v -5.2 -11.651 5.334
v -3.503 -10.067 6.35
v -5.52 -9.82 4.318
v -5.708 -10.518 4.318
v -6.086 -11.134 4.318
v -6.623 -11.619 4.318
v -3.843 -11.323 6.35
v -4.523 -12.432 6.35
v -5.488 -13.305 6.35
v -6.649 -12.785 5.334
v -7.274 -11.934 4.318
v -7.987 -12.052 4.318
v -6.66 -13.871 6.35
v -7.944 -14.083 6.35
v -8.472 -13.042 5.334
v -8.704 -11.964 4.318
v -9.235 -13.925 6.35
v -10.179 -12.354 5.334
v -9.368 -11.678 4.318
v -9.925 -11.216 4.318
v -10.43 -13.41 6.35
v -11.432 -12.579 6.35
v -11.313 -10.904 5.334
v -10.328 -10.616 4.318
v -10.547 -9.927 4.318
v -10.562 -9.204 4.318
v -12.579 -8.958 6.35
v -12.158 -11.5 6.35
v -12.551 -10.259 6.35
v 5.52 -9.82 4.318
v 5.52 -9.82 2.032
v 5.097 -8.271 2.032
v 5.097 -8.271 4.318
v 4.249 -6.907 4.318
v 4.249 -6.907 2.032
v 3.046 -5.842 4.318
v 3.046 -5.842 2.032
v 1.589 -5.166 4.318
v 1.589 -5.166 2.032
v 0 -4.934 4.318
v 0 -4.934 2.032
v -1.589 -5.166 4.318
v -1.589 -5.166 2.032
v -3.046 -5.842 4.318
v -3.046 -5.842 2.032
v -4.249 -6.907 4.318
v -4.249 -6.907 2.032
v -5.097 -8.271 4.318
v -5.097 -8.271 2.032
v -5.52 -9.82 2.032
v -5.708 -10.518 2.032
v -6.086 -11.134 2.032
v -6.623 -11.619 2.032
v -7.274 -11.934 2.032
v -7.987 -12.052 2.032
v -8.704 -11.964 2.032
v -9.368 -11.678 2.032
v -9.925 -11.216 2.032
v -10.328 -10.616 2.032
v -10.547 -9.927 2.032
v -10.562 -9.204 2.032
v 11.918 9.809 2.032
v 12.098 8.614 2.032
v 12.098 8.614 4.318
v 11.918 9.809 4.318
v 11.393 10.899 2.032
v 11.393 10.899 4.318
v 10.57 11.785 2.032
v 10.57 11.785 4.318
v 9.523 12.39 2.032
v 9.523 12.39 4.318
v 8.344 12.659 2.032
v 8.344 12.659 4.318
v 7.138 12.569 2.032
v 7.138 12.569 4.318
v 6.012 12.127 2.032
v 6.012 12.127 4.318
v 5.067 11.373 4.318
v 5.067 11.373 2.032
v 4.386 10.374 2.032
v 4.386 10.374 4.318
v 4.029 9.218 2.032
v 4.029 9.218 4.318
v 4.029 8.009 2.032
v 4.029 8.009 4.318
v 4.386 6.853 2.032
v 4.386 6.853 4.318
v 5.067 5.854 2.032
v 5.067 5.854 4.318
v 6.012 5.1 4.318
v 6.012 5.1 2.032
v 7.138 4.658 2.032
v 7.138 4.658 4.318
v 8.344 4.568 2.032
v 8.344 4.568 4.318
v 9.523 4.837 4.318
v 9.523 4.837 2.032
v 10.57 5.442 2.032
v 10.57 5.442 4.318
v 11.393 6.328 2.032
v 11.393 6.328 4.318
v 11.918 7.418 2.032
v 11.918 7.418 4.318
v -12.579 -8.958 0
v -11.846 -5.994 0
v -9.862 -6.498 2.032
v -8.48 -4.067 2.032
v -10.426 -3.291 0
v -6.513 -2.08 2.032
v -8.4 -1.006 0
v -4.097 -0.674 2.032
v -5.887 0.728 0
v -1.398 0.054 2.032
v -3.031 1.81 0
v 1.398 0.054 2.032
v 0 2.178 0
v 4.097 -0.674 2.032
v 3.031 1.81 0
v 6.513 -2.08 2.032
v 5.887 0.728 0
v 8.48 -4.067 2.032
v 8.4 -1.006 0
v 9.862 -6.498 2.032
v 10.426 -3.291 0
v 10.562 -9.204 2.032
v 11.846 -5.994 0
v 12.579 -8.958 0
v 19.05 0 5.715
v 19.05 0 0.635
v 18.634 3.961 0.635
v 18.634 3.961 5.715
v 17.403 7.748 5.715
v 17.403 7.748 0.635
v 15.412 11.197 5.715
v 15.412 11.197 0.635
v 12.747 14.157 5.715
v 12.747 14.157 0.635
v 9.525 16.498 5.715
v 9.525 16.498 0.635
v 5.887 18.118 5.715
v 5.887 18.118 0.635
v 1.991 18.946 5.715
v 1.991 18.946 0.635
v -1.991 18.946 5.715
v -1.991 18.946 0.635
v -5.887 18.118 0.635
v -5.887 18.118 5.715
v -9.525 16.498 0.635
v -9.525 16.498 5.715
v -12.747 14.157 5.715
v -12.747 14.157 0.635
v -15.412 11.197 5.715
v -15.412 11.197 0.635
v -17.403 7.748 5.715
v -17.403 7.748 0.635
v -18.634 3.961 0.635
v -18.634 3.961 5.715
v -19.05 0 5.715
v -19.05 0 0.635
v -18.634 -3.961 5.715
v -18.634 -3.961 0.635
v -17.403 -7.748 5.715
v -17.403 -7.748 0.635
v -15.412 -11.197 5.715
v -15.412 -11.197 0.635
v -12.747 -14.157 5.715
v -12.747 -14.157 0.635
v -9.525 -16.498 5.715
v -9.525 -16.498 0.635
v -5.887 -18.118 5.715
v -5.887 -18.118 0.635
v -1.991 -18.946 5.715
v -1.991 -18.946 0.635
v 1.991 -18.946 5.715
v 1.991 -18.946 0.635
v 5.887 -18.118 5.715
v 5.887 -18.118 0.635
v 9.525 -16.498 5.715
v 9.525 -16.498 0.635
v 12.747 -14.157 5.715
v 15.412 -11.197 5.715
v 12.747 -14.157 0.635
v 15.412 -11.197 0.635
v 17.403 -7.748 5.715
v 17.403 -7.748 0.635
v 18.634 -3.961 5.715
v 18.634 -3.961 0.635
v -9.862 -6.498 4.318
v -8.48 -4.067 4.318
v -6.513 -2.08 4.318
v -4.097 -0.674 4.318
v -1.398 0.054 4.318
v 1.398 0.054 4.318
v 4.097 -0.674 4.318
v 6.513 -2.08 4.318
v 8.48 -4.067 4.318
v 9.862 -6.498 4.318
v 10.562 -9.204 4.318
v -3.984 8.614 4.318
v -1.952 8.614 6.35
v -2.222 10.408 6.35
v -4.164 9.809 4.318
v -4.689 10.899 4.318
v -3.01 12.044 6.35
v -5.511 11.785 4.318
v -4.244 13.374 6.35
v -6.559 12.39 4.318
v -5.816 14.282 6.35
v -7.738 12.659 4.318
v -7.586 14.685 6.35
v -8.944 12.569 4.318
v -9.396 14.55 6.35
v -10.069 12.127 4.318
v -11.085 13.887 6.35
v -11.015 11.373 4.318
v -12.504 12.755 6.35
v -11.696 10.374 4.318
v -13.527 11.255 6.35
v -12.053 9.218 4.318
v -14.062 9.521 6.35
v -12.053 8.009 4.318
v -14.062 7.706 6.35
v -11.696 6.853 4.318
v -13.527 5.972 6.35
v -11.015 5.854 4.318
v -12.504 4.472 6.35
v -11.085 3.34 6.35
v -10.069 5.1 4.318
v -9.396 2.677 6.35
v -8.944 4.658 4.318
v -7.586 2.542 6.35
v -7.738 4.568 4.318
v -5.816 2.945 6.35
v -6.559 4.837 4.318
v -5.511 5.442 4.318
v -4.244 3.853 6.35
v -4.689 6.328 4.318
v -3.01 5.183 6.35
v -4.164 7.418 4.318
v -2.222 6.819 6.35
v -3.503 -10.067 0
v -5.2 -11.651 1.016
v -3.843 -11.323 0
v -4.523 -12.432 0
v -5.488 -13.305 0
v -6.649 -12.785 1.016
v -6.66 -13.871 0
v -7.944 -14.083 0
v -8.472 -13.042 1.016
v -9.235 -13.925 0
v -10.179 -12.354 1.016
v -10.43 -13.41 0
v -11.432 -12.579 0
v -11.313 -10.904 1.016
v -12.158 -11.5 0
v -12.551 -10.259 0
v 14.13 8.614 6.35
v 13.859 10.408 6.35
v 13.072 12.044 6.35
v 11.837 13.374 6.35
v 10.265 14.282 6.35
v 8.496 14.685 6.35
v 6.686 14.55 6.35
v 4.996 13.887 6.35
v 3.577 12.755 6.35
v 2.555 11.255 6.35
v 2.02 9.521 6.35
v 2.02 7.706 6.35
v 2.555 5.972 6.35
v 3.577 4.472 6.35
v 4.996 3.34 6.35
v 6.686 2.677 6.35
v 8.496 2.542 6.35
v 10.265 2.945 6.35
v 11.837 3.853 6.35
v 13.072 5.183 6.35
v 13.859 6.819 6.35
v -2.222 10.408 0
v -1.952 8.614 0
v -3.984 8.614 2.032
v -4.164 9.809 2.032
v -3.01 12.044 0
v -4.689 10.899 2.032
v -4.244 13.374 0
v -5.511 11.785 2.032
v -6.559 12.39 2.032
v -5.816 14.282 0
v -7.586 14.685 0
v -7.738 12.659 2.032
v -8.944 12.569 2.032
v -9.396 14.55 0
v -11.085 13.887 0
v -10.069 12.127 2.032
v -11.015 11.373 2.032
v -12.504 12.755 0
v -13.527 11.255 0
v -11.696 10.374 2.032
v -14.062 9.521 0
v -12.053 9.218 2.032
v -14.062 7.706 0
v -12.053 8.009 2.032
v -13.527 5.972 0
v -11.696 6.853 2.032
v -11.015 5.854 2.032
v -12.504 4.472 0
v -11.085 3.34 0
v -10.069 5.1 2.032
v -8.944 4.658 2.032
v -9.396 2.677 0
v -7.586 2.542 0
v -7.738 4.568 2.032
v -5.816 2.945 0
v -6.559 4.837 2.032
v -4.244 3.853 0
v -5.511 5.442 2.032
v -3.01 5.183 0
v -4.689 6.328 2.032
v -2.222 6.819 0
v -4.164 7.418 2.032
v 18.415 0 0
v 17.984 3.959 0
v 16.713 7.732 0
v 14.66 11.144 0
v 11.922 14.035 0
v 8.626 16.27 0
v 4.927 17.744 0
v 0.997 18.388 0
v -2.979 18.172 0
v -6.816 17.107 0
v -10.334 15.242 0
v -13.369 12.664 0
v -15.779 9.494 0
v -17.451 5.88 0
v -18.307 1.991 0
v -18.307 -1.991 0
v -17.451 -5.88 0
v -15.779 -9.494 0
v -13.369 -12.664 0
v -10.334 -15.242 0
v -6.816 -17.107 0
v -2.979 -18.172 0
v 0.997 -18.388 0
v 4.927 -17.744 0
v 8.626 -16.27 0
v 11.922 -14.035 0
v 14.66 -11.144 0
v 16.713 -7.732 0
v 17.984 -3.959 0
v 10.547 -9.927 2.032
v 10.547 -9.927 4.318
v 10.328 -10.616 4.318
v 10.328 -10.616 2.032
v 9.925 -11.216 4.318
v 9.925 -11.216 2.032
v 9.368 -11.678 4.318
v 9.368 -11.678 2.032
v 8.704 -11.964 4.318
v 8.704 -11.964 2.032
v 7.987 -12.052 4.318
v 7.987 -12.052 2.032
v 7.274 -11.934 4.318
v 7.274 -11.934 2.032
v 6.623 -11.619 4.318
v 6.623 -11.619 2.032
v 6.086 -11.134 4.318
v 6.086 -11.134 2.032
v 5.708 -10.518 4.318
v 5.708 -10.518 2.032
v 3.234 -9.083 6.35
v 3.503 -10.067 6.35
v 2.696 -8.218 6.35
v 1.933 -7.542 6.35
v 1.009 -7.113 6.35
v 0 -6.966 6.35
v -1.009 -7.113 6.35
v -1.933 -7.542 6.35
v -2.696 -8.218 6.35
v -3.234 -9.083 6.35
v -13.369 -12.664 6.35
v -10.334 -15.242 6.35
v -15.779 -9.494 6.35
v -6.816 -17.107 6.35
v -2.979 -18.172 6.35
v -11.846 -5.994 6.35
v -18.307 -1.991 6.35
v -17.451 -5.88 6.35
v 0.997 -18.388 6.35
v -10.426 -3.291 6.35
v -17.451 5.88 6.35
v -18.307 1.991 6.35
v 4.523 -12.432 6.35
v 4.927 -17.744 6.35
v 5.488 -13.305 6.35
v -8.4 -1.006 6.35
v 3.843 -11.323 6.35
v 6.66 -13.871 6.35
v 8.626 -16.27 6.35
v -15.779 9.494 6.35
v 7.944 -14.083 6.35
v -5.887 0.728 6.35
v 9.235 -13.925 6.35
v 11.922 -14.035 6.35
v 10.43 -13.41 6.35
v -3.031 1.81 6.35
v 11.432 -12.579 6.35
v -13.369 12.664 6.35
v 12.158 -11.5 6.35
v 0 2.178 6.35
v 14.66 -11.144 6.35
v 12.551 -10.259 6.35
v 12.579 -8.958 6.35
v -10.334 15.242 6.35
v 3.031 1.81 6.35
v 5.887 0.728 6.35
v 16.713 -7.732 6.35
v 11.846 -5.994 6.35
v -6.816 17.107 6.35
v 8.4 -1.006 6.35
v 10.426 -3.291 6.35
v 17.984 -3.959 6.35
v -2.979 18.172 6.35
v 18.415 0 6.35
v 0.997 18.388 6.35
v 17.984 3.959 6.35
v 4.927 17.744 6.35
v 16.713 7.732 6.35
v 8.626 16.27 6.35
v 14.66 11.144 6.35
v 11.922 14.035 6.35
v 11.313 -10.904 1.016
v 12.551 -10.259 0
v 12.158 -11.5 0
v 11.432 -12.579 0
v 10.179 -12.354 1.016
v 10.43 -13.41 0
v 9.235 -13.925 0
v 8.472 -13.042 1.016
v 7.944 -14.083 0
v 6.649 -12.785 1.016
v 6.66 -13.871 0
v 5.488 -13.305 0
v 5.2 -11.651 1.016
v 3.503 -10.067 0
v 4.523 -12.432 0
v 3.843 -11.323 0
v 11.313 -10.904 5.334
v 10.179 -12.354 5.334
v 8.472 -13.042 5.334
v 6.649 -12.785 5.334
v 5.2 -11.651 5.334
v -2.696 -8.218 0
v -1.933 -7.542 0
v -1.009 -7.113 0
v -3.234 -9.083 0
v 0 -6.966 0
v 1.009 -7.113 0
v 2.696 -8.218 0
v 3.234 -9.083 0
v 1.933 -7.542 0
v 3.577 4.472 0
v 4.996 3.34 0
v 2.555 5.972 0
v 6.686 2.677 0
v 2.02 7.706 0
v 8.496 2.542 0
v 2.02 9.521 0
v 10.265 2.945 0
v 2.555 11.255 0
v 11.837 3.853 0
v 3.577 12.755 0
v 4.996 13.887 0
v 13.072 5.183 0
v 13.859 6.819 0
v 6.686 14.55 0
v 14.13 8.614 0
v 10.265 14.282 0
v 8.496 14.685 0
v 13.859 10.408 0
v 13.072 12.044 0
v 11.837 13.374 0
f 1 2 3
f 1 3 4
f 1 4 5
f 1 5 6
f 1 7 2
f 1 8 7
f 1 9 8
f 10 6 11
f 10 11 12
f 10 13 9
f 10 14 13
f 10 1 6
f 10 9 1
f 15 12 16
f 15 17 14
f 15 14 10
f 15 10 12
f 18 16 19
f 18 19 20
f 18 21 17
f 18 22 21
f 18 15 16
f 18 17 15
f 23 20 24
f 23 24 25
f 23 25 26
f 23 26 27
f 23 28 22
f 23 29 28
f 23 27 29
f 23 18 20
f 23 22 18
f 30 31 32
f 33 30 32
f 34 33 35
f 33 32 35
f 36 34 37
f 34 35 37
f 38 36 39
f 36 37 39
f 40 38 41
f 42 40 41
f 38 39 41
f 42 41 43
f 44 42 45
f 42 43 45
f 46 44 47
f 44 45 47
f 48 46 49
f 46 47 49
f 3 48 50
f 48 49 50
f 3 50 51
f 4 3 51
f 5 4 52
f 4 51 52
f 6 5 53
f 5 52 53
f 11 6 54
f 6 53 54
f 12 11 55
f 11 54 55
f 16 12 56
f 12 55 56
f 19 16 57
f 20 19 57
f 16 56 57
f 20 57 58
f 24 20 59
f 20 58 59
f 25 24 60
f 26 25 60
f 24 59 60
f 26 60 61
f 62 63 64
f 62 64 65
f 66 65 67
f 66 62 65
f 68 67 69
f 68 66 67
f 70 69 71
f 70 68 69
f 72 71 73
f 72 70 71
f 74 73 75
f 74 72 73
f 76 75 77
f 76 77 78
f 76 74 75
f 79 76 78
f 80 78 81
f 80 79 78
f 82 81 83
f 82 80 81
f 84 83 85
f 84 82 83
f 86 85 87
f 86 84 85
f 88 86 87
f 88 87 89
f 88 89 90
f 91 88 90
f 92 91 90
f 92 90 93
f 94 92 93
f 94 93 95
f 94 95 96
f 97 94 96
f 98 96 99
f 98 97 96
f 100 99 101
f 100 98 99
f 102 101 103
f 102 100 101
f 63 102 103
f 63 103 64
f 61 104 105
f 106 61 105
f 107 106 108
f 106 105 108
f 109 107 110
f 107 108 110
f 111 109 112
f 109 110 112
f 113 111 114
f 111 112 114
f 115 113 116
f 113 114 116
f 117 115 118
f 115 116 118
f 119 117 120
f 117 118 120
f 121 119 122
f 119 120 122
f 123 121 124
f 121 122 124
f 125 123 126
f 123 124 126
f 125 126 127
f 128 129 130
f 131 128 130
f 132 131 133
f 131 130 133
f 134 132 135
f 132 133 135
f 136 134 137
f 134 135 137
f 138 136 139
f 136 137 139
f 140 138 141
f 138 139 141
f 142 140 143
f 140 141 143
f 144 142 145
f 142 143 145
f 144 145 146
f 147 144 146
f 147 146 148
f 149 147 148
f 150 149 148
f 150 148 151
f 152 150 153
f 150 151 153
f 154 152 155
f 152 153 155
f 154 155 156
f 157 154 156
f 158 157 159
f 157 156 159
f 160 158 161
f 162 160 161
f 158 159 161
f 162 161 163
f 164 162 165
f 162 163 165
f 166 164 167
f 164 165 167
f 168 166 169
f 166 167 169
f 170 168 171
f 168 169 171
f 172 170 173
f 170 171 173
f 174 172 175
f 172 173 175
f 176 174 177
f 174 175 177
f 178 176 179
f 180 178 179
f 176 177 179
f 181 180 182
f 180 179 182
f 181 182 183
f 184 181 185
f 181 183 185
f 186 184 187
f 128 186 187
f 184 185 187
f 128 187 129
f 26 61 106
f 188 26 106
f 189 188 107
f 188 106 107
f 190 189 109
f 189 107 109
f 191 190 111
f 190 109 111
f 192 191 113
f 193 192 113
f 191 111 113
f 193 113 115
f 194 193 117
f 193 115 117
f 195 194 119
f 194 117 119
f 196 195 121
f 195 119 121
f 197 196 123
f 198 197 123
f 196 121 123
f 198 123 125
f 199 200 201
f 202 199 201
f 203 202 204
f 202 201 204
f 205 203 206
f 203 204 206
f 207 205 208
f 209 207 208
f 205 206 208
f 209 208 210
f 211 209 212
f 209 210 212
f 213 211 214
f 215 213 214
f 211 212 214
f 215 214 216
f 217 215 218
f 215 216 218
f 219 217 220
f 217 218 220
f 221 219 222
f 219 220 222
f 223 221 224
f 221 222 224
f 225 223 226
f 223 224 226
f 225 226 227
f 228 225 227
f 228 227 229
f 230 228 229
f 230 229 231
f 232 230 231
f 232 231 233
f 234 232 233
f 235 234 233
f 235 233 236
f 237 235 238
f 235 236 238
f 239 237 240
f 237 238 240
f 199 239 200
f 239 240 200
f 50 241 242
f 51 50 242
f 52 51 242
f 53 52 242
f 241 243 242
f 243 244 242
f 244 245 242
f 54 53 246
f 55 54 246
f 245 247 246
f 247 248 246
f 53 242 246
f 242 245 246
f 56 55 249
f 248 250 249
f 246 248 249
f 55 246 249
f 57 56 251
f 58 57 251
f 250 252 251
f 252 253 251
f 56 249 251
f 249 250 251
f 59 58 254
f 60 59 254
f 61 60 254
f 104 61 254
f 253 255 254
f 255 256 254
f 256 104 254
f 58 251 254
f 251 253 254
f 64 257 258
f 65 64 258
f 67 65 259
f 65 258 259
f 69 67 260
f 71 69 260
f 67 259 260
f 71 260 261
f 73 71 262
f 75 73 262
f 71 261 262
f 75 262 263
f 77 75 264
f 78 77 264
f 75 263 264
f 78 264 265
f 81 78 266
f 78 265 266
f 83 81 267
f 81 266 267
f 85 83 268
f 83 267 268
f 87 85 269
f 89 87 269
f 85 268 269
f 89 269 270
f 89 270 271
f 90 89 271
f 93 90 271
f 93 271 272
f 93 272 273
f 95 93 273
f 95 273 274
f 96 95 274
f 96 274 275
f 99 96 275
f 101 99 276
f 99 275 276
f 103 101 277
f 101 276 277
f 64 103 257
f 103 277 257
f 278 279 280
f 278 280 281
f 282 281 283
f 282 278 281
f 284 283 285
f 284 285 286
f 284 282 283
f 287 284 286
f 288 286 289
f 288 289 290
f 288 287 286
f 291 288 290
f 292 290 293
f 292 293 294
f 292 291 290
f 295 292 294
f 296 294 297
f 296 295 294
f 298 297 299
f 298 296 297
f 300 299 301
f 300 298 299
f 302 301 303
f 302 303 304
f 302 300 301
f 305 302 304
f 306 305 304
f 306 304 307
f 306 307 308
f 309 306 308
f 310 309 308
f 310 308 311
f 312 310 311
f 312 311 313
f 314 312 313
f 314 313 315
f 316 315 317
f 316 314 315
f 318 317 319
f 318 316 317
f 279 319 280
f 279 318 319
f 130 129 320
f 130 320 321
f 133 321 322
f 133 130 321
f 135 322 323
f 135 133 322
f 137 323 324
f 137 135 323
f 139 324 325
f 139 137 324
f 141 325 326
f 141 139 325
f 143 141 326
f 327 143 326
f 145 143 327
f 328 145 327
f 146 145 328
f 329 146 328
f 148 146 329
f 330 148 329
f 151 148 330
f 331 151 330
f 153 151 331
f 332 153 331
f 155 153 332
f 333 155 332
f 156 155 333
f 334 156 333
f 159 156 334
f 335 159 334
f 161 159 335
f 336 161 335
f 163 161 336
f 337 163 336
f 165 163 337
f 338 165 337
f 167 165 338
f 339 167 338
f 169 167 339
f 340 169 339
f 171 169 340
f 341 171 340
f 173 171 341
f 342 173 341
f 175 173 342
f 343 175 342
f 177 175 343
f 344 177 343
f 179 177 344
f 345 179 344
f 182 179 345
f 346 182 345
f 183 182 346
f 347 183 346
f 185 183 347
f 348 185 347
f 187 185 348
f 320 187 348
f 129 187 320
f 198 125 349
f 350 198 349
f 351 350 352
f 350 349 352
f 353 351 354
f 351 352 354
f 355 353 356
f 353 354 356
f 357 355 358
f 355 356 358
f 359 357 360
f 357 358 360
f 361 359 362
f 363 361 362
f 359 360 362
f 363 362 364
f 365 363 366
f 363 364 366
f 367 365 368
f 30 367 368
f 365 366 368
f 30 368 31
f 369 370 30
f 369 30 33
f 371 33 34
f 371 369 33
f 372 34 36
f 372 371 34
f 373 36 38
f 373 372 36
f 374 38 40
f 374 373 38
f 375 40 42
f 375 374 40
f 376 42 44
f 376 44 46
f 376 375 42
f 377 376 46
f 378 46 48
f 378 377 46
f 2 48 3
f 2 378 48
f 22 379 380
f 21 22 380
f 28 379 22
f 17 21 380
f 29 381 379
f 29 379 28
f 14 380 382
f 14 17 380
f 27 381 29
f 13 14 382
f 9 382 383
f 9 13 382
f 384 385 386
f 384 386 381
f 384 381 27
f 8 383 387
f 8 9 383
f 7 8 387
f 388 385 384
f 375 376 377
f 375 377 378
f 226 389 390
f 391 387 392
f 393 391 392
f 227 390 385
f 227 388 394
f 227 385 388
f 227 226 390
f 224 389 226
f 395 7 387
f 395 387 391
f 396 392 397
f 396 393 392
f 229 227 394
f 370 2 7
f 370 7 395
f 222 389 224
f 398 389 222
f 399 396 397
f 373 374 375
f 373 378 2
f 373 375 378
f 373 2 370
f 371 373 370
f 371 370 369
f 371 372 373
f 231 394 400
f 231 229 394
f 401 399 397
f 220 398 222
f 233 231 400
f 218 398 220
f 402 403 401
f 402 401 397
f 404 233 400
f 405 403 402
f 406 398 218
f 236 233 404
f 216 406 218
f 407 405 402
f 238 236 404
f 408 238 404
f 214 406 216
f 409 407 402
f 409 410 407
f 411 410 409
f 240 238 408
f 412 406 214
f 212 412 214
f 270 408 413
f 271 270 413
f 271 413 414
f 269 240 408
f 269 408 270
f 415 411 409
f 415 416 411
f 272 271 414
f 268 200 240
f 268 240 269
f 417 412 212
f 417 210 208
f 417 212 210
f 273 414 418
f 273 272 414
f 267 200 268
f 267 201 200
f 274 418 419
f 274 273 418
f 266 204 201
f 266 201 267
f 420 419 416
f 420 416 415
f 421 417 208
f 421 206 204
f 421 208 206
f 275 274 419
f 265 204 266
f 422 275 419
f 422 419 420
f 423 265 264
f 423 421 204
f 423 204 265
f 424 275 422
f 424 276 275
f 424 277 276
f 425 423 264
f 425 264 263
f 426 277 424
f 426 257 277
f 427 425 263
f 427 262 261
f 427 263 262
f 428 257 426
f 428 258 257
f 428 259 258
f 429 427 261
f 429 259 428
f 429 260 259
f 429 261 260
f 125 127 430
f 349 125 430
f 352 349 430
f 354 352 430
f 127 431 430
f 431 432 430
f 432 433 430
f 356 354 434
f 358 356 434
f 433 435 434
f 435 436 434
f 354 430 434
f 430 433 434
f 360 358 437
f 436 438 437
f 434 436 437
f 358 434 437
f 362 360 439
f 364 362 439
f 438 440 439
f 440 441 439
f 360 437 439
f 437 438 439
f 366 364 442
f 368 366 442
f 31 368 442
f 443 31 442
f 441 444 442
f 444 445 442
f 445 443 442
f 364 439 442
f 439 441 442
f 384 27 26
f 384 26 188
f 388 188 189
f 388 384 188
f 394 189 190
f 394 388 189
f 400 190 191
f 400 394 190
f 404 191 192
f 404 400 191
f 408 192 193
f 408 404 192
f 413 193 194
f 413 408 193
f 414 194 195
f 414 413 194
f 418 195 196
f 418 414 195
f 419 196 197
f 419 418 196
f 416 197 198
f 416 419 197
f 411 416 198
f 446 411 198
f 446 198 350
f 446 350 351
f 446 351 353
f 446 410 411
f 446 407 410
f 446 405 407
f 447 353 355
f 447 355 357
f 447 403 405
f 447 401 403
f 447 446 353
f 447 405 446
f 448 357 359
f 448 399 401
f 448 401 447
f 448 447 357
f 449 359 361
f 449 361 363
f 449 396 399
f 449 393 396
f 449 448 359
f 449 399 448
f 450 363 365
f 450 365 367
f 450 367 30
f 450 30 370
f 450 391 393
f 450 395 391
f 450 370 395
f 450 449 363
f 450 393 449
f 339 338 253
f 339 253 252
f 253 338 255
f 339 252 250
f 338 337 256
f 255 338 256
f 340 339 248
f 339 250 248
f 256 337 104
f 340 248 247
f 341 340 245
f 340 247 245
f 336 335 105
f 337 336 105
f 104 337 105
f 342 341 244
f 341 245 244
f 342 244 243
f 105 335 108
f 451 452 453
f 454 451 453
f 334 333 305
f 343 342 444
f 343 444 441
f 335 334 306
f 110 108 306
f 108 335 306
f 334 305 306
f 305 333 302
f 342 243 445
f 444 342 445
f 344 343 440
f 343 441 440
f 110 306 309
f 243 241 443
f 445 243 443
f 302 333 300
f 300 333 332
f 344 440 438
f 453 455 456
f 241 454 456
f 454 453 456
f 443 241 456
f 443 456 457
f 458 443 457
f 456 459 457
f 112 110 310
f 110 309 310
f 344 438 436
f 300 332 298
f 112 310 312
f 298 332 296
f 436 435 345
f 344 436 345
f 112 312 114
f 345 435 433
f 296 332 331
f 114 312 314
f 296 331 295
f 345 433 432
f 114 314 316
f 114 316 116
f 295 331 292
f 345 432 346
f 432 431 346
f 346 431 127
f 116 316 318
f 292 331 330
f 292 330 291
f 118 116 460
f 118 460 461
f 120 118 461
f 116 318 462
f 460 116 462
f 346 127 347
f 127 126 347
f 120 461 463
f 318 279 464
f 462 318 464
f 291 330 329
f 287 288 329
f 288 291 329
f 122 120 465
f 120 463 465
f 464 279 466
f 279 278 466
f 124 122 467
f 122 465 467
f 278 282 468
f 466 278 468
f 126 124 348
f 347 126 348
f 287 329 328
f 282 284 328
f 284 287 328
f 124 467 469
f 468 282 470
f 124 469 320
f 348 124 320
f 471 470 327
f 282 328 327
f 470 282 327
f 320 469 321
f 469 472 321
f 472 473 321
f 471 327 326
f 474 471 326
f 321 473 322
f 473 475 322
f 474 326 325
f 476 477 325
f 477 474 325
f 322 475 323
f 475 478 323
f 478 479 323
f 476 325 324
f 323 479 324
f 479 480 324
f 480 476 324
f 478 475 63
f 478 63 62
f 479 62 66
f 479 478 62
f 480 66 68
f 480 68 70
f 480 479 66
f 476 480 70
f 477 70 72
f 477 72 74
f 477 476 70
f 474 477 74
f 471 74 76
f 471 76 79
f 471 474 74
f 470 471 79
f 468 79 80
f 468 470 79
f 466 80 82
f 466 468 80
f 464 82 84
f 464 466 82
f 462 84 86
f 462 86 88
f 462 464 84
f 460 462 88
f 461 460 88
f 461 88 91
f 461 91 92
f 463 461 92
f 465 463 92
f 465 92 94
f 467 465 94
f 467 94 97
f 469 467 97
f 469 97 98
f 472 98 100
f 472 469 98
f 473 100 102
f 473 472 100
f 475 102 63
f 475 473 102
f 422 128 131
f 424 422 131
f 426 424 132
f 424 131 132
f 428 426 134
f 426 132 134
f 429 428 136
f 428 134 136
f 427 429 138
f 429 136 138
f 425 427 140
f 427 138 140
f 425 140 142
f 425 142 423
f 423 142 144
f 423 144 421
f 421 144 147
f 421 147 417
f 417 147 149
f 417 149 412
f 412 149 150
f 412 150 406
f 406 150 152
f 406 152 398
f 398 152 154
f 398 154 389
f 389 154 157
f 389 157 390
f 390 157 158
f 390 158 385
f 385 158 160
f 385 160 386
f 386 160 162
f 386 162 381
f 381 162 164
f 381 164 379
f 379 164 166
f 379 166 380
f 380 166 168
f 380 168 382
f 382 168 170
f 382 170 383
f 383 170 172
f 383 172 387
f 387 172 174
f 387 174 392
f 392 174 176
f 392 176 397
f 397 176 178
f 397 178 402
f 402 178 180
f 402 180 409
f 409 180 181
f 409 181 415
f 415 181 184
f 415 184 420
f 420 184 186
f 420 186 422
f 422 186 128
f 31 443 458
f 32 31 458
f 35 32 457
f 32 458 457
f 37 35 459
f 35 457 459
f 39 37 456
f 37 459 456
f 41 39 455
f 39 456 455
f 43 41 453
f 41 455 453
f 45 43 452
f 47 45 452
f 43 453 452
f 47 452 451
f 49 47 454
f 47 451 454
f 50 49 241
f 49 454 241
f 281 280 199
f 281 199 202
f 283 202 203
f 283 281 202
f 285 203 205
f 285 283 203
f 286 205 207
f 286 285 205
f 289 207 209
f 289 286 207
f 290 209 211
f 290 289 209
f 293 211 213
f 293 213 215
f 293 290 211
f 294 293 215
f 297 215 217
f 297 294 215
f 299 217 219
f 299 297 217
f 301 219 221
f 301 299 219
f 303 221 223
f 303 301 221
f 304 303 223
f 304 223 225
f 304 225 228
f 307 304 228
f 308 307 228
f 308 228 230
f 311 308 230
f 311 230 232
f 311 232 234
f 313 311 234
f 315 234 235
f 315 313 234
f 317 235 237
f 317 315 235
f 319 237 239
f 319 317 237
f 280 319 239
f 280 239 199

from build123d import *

# Parameters (mm, degrees)
F0_R     = 19.05
F0_R_2   = 4.056964
F1_DEPTH = 6.35
F2_SIZE  = 2.032
F3_SIZE  = 0.635


with BuildPart() as f1:
    # F0 (on Top) → F1 (new body)
    with BuildSketch(Plane.XY):
        Circle(F0_R)
        with BuildLine():
            ThreePointArc((-10.56212, -9.204333), (0, 0.146205), (10.56212, -9.204333))
            ThreePointArc((10.56212, -9.204333), (8.348809, -12.033548), (5.519595, -9.820236))
            ThreePointArc((5.519595, -9.820236), (0, -4.933795), (-5.519595, -9.820236))
            ThreePointArc((-5.519595, -9.820236), (-8.348809, -12.033548), (-10.56212, -9.204333))
        make_face(mode=Mode.SUBTRACT)
        with Locations((-8.040858, 8.613517)):
            Circle(F0_R_2, mode=Mode.SUBTRACT)
        with Locations((8.040858, 8.613517)):
            Circle(F0_R_2, mode=Mode.SUBTRACT)
    extrude(amount=F1_DEPTH)

    # F2
    f2_edges = [f1.edges().sort_by_distance(p)[0] for p in [
        (0, 0.146205, 6.35),
        (0, 0.146205, 0),
        (0, -4.933795, 6.35),
        (8.348809, -12.033548, 6.35),
        (-8.348809, -12.033548, 6.35),
        (8.348809, -12.033548, 0),
        (0, -4.933795, 0),
        (-8.348809, -12.033548, 0),
        (3.983894, 8.613517, 6.35),
        (3.983894, 8.613517, 0),
        (-12.097821, 8.613517, 0),
        (-12.097821, 8.613517, 6.35),
    ]]
    chamfer(f2_edges, length=F2_SIZE)

    # F3
    f3_edges = [f1.edges().sort_by_distance(p)[0] for p in [
        (-19.05, 0, 6.35),
        (-19.05, 0, 0),
    ]]
    chamfer(f3_edges, length=F3_SIZE)


solid = f1.part
